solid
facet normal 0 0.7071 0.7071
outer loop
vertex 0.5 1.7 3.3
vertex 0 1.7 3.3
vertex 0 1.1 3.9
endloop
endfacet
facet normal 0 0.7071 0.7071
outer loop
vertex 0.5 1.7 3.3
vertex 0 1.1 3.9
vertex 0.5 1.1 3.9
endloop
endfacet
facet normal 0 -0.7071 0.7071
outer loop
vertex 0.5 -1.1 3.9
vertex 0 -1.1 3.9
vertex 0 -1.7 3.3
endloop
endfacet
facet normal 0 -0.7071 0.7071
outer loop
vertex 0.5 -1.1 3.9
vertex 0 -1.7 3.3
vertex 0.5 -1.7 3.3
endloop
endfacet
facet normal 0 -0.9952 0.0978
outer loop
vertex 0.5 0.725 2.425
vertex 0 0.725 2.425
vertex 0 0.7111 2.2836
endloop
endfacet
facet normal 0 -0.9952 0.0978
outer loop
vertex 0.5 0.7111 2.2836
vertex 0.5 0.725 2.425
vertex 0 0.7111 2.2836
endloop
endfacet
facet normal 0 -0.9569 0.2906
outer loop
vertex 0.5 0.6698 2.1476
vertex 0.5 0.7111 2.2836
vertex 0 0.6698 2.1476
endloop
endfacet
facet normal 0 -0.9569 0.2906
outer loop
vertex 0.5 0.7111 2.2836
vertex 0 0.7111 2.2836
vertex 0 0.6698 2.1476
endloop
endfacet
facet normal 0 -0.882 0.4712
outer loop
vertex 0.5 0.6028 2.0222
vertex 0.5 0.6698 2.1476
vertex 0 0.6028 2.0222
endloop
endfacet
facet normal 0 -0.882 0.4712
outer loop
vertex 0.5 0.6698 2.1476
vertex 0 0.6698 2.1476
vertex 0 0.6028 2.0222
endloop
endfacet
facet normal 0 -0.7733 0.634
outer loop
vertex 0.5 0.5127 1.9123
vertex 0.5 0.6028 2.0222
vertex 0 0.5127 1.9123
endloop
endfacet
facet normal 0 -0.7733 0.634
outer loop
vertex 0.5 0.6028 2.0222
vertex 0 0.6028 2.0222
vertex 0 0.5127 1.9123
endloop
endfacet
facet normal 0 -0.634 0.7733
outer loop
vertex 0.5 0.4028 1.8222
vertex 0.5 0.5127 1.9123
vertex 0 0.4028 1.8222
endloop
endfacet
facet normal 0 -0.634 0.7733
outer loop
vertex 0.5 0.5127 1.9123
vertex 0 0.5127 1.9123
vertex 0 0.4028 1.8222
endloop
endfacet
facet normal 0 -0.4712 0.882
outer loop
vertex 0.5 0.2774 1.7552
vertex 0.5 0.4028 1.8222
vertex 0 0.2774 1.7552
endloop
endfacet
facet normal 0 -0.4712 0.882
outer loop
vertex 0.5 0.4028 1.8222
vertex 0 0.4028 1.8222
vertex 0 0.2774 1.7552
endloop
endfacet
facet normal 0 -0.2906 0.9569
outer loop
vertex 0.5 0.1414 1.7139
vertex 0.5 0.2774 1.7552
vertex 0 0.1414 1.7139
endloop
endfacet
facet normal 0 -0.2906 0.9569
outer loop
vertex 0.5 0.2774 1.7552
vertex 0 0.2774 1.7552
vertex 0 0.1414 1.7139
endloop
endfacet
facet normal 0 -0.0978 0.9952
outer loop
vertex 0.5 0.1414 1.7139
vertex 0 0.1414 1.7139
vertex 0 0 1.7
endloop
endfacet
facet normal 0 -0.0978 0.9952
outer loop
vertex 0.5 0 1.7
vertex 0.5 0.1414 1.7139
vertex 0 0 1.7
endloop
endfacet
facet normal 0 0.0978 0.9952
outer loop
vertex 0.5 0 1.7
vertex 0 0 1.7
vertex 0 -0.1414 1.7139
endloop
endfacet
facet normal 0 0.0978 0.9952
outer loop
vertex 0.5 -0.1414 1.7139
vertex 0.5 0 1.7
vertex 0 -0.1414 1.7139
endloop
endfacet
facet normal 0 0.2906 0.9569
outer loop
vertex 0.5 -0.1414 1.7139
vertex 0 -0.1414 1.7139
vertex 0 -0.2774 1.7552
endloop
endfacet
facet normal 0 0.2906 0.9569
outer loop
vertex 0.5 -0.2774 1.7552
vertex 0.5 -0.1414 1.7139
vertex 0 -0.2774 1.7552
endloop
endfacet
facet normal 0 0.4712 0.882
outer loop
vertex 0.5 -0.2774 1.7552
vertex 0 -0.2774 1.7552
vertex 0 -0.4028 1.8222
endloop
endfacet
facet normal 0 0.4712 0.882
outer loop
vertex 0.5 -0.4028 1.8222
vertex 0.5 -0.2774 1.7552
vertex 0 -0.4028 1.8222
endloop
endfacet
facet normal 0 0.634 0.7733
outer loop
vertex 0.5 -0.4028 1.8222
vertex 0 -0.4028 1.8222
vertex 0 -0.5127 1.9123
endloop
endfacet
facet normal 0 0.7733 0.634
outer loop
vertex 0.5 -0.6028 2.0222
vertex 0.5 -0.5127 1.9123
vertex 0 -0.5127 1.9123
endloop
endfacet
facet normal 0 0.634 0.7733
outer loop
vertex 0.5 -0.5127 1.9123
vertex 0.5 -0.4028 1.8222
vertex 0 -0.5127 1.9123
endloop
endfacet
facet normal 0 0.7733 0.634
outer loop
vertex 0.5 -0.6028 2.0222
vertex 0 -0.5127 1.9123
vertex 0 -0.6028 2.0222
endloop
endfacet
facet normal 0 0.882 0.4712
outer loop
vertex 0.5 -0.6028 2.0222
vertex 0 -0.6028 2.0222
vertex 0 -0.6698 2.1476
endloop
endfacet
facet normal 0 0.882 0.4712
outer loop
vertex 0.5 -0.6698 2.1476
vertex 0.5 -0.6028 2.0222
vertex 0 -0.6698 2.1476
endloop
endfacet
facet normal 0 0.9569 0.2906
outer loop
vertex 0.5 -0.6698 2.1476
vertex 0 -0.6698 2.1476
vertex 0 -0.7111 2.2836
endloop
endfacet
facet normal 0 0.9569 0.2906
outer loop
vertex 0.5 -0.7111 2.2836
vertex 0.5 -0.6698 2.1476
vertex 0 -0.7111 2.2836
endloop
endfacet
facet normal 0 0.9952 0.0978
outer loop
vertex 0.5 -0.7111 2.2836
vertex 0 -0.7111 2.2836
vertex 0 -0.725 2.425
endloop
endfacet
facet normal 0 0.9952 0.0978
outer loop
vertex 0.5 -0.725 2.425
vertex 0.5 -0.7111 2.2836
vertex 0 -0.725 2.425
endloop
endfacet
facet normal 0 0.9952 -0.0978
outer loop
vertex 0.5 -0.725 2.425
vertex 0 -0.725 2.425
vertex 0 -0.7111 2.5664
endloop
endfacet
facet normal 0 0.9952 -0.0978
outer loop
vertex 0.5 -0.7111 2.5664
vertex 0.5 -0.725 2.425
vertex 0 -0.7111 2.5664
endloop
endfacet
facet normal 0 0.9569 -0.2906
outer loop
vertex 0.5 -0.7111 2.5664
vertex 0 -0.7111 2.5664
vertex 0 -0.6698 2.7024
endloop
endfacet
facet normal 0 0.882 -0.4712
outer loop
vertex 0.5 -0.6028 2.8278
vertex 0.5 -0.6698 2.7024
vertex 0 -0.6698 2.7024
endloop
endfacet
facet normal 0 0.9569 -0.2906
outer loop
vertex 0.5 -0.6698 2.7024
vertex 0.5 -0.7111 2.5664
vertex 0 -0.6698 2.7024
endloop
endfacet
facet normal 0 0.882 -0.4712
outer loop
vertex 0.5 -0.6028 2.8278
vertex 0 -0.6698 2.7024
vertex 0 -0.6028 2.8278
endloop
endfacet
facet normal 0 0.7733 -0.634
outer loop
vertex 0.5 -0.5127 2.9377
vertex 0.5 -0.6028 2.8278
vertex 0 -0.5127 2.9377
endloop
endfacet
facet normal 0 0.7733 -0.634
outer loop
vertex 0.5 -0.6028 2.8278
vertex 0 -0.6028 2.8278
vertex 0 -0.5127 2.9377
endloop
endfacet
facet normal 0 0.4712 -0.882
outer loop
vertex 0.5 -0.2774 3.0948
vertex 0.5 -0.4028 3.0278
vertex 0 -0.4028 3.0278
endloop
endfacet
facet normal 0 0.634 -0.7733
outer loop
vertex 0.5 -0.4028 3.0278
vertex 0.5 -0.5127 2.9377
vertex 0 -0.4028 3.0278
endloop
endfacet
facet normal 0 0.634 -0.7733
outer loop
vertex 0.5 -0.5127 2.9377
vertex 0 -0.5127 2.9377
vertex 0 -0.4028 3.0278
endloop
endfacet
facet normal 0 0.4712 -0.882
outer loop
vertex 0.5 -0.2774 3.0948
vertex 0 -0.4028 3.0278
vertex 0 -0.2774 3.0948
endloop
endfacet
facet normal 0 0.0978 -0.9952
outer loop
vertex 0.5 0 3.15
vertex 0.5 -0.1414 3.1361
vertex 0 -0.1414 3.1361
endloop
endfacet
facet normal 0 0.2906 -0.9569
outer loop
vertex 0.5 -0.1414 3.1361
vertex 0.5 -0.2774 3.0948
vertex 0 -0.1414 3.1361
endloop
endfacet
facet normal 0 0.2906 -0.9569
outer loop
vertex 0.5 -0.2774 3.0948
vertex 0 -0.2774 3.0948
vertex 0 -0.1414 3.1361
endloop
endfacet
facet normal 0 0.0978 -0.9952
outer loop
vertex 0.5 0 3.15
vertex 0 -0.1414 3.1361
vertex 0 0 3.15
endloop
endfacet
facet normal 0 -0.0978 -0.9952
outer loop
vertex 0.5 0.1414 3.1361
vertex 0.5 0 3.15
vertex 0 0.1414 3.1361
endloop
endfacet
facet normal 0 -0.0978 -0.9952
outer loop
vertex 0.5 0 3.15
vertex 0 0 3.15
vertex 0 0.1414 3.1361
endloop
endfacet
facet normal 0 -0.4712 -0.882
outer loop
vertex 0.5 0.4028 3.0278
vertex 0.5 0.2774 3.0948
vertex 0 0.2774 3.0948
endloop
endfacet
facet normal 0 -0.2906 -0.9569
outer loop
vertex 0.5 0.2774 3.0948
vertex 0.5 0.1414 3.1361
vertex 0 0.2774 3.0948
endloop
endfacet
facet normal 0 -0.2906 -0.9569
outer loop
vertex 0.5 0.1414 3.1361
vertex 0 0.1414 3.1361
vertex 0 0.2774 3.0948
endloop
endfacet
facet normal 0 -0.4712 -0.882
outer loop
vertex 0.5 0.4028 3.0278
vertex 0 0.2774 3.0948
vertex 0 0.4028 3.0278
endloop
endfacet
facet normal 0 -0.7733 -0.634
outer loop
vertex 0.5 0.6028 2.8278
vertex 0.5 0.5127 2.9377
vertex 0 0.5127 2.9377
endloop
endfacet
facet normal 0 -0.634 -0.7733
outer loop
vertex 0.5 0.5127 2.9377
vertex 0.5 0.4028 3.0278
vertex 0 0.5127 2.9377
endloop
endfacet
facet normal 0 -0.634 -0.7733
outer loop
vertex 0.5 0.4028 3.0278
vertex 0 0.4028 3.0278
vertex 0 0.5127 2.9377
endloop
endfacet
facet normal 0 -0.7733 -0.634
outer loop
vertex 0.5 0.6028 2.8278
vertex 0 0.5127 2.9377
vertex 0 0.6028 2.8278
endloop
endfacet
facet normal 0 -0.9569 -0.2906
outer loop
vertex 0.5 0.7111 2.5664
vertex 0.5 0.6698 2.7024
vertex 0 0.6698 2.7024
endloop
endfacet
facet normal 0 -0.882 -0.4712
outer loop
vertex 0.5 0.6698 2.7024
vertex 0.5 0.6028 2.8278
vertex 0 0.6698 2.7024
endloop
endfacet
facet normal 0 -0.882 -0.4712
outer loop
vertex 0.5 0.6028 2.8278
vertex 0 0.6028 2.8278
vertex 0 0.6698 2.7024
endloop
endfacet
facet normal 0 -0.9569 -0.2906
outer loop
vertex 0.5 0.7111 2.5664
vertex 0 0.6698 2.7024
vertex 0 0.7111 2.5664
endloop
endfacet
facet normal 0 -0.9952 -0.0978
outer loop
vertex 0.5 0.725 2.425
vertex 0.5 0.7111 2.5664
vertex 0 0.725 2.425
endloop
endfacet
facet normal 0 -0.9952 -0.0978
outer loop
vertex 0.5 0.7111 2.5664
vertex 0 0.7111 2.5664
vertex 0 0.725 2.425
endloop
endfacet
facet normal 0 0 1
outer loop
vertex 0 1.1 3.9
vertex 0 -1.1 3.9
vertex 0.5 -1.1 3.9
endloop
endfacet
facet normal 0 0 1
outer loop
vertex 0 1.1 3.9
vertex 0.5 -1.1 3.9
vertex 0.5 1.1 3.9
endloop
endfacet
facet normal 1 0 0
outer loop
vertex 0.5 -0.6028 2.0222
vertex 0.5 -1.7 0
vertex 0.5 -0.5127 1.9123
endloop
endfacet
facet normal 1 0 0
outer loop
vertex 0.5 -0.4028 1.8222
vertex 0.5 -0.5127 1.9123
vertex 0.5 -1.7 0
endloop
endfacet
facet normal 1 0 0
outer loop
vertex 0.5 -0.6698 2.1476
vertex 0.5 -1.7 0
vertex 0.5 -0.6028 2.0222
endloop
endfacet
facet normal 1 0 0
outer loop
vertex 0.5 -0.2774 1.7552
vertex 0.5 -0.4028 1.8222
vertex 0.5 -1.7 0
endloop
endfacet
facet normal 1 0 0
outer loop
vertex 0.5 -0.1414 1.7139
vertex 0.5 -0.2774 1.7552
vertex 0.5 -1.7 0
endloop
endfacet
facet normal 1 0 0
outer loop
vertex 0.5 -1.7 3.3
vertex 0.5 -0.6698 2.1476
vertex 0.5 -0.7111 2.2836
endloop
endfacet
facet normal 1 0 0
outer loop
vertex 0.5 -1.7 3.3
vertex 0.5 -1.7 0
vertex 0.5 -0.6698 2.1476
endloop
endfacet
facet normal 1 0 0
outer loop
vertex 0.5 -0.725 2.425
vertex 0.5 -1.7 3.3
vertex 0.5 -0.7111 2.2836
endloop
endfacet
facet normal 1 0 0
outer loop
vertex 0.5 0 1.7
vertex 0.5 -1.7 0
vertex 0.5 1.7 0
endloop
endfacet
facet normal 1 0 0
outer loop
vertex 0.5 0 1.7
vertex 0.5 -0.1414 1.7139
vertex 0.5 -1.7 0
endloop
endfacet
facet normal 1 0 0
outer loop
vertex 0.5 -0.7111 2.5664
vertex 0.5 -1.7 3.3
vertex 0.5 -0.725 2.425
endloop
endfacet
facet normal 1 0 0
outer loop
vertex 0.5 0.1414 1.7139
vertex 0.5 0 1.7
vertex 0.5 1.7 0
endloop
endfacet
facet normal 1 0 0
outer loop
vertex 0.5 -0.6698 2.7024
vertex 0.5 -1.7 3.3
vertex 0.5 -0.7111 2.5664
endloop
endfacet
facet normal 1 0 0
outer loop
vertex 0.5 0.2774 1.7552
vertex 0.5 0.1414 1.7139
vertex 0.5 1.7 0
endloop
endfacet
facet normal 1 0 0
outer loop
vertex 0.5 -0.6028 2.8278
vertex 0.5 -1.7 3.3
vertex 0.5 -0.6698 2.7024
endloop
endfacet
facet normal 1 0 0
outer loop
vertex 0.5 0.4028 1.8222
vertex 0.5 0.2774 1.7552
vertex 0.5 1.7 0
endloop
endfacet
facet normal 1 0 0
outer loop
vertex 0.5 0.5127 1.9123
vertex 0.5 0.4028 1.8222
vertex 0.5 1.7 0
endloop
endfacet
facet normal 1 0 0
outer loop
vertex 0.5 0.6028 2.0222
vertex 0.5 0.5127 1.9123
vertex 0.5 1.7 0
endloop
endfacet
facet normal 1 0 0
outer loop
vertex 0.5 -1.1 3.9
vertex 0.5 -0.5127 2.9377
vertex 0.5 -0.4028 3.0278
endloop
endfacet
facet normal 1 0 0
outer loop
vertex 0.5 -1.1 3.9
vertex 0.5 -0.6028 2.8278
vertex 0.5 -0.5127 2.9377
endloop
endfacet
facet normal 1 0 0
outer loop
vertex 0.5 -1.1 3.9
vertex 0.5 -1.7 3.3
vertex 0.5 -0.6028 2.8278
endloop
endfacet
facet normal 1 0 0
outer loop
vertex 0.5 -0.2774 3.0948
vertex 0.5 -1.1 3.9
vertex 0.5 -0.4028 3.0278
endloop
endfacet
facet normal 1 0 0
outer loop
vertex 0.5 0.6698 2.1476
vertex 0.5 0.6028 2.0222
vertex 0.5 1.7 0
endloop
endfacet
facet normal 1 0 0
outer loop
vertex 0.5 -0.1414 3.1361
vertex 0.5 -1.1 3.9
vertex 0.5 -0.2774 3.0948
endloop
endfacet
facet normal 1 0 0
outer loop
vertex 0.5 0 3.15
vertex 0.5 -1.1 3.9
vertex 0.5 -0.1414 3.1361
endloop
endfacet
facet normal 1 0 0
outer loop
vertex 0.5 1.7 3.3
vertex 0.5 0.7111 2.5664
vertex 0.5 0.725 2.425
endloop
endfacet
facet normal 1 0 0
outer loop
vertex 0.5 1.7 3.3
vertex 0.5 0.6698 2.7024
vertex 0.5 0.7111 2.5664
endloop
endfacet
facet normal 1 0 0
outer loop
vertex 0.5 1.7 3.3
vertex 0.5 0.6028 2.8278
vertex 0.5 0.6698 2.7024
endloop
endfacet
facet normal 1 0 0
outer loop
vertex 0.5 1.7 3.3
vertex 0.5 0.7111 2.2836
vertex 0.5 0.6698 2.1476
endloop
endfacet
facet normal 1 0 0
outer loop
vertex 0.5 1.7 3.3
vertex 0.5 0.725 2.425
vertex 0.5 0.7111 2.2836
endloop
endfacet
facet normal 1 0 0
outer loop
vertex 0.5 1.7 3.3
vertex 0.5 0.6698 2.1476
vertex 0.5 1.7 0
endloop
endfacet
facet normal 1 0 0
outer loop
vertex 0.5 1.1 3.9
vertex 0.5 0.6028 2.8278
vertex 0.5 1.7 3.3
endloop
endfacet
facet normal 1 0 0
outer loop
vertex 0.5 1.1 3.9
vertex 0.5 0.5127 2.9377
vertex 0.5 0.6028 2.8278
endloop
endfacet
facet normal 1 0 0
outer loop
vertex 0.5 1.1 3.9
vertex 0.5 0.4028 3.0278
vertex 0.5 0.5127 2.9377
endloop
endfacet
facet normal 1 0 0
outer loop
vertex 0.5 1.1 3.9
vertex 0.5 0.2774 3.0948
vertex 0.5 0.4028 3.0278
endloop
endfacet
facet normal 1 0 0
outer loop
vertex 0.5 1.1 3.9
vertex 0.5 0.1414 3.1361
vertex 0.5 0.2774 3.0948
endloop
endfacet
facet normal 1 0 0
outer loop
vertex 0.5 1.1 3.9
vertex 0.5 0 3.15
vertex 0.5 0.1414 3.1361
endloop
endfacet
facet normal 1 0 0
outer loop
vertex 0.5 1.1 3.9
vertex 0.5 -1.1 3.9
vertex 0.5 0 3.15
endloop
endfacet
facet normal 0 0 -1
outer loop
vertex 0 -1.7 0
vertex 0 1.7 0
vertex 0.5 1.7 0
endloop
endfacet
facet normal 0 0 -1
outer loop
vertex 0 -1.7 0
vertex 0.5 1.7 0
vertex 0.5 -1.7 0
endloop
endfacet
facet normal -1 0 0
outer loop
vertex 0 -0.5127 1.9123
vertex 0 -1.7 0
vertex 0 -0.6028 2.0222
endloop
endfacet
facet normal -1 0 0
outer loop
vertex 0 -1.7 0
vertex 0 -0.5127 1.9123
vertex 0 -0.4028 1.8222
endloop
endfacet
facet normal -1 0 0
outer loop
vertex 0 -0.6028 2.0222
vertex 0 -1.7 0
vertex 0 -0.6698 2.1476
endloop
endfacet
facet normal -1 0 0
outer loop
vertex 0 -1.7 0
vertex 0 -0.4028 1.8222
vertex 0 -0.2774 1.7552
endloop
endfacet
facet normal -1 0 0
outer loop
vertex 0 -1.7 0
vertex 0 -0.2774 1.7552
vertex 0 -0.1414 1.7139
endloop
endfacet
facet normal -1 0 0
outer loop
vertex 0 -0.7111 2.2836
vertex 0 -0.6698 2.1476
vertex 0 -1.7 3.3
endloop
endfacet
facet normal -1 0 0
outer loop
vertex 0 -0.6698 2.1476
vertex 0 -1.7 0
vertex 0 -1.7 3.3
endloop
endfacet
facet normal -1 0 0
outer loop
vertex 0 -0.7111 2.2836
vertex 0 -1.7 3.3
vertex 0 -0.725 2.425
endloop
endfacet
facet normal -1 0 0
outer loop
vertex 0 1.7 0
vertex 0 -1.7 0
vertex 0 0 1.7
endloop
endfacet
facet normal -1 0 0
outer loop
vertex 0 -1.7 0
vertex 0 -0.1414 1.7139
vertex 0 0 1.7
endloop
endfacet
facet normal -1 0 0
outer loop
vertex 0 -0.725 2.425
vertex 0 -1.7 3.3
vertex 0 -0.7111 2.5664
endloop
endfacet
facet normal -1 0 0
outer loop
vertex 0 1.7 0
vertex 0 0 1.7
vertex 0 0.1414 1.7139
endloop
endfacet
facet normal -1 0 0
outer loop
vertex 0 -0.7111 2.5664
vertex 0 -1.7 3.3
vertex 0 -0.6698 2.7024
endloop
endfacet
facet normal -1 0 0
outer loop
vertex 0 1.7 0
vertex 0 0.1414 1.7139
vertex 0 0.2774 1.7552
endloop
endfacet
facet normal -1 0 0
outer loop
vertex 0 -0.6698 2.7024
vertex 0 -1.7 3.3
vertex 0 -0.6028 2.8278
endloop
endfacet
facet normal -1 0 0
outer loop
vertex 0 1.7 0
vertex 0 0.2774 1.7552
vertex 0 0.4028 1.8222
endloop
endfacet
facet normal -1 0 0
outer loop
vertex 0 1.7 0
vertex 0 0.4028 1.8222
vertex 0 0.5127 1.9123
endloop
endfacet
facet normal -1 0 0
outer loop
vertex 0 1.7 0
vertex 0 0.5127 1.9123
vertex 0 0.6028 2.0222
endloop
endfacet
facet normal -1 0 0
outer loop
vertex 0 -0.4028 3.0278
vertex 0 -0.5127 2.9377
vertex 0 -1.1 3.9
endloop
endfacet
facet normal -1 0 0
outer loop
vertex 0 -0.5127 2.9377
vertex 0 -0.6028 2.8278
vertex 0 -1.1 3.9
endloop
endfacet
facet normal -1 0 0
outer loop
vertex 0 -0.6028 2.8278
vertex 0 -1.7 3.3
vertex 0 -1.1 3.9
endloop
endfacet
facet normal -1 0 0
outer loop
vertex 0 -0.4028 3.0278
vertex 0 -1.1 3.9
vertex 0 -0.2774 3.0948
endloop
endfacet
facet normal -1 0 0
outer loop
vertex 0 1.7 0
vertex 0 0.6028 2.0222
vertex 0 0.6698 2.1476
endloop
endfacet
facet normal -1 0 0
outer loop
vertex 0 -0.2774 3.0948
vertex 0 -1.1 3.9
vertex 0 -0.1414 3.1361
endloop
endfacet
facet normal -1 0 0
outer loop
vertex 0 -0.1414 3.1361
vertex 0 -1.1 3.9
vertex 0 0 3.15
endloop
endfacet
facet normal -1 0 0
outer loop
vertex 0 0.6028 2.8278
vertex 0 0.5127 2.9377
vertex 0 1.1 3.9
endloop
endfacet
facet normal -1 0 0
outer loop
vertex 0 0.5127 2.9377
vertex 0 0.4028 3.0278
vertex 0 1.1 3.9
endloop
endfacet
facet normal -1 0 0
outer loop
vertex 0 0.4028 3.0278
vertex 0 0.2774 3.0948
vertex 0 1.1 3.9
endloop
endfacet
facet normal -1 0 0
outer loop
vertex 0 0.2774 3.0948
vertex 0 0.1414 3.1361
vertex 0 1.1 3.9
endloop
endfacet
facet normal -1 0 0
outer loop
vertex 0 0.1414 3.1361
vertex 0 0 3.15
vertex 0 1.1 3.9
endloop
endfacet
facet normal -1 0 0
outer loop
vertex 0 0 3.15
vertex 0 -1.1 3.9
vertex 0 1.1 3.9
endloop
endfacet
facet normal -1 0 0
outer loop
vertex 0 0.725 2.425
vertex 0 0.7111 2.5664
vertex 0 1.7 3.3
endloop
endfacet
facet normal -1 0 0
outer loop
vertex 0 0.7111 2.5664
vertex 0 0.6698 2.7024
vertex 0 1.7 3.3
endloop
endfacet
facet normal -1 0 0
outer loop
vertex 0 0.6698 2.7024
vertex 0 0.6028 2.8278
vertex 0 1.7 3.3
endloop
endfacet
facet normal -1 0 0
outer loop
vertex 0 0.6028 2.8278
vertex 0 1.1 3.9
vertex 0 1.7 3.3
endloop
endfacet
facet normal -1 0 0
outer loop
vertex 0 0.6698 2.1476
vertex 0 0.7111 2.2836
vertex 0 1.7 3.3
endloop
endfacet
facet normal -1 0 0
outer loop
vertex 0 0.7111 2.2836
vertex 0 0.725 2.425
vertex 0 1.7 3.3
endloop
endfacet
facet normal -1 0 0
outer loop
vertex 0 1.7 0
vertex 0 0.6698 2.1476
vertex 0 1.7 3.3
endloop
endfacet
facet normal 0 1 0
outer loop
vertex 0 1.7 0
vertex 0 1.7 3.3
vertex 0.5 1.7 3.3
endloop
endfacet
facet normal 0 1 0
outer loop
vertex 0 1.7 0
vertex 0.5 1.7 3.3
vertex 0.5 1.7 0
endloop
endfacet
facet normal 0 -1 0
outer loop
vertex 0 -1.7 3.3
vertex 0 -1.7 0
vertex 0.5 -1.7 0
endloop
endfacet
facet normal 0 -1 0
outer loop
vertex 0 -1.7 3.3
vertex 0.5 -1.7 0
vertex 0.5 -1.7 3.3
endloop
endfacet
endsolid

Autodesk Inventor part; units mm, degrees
ref_plane "YZ Plane" through (0, 0, 0) normal (1, 0, 0) x (0, 1, 0)
ref_plane "XZ Plane" through (0, 0, 0) normal (0, 1, 0) x (-1, 0, 0)
ref_plane "XY Plane" through (0, 0, 0) normal (0, 0, 1) x (1, 0, 0)
sketch "Sketch1" plane through (0, 0, 0) normal (1, 0, 0) x (0, 1, 0)
  line L0 (1.7, 0) -> (-1.7, 0)
  line L1 (-1.7, 0) -> (-1.7, 3.9)
  line L2 (-1.7, 3.9) -> (1.7, 3.9)
  line L3 (1.7, 3.9) -> (1.7, 0)
  circle A0 centre (0, 2.425) radius 0.725
  point P0 (0, 0)
  point P1 (0, 0)
  dimension "d0" = 3.9
  dimension "d2" = 3.4
  dimension "d3" = 1.45
  dimension "d4" = 0.75
extrude "Extrusion1" add sketch "Sketch1" along normal blind 0.5
chamfer "Chamfer1" distance 0.6 angle 45 2 edges at (0.25, 1.7, 3.9) (0.25, -1.7, 3.9)
properties material "Gold"
